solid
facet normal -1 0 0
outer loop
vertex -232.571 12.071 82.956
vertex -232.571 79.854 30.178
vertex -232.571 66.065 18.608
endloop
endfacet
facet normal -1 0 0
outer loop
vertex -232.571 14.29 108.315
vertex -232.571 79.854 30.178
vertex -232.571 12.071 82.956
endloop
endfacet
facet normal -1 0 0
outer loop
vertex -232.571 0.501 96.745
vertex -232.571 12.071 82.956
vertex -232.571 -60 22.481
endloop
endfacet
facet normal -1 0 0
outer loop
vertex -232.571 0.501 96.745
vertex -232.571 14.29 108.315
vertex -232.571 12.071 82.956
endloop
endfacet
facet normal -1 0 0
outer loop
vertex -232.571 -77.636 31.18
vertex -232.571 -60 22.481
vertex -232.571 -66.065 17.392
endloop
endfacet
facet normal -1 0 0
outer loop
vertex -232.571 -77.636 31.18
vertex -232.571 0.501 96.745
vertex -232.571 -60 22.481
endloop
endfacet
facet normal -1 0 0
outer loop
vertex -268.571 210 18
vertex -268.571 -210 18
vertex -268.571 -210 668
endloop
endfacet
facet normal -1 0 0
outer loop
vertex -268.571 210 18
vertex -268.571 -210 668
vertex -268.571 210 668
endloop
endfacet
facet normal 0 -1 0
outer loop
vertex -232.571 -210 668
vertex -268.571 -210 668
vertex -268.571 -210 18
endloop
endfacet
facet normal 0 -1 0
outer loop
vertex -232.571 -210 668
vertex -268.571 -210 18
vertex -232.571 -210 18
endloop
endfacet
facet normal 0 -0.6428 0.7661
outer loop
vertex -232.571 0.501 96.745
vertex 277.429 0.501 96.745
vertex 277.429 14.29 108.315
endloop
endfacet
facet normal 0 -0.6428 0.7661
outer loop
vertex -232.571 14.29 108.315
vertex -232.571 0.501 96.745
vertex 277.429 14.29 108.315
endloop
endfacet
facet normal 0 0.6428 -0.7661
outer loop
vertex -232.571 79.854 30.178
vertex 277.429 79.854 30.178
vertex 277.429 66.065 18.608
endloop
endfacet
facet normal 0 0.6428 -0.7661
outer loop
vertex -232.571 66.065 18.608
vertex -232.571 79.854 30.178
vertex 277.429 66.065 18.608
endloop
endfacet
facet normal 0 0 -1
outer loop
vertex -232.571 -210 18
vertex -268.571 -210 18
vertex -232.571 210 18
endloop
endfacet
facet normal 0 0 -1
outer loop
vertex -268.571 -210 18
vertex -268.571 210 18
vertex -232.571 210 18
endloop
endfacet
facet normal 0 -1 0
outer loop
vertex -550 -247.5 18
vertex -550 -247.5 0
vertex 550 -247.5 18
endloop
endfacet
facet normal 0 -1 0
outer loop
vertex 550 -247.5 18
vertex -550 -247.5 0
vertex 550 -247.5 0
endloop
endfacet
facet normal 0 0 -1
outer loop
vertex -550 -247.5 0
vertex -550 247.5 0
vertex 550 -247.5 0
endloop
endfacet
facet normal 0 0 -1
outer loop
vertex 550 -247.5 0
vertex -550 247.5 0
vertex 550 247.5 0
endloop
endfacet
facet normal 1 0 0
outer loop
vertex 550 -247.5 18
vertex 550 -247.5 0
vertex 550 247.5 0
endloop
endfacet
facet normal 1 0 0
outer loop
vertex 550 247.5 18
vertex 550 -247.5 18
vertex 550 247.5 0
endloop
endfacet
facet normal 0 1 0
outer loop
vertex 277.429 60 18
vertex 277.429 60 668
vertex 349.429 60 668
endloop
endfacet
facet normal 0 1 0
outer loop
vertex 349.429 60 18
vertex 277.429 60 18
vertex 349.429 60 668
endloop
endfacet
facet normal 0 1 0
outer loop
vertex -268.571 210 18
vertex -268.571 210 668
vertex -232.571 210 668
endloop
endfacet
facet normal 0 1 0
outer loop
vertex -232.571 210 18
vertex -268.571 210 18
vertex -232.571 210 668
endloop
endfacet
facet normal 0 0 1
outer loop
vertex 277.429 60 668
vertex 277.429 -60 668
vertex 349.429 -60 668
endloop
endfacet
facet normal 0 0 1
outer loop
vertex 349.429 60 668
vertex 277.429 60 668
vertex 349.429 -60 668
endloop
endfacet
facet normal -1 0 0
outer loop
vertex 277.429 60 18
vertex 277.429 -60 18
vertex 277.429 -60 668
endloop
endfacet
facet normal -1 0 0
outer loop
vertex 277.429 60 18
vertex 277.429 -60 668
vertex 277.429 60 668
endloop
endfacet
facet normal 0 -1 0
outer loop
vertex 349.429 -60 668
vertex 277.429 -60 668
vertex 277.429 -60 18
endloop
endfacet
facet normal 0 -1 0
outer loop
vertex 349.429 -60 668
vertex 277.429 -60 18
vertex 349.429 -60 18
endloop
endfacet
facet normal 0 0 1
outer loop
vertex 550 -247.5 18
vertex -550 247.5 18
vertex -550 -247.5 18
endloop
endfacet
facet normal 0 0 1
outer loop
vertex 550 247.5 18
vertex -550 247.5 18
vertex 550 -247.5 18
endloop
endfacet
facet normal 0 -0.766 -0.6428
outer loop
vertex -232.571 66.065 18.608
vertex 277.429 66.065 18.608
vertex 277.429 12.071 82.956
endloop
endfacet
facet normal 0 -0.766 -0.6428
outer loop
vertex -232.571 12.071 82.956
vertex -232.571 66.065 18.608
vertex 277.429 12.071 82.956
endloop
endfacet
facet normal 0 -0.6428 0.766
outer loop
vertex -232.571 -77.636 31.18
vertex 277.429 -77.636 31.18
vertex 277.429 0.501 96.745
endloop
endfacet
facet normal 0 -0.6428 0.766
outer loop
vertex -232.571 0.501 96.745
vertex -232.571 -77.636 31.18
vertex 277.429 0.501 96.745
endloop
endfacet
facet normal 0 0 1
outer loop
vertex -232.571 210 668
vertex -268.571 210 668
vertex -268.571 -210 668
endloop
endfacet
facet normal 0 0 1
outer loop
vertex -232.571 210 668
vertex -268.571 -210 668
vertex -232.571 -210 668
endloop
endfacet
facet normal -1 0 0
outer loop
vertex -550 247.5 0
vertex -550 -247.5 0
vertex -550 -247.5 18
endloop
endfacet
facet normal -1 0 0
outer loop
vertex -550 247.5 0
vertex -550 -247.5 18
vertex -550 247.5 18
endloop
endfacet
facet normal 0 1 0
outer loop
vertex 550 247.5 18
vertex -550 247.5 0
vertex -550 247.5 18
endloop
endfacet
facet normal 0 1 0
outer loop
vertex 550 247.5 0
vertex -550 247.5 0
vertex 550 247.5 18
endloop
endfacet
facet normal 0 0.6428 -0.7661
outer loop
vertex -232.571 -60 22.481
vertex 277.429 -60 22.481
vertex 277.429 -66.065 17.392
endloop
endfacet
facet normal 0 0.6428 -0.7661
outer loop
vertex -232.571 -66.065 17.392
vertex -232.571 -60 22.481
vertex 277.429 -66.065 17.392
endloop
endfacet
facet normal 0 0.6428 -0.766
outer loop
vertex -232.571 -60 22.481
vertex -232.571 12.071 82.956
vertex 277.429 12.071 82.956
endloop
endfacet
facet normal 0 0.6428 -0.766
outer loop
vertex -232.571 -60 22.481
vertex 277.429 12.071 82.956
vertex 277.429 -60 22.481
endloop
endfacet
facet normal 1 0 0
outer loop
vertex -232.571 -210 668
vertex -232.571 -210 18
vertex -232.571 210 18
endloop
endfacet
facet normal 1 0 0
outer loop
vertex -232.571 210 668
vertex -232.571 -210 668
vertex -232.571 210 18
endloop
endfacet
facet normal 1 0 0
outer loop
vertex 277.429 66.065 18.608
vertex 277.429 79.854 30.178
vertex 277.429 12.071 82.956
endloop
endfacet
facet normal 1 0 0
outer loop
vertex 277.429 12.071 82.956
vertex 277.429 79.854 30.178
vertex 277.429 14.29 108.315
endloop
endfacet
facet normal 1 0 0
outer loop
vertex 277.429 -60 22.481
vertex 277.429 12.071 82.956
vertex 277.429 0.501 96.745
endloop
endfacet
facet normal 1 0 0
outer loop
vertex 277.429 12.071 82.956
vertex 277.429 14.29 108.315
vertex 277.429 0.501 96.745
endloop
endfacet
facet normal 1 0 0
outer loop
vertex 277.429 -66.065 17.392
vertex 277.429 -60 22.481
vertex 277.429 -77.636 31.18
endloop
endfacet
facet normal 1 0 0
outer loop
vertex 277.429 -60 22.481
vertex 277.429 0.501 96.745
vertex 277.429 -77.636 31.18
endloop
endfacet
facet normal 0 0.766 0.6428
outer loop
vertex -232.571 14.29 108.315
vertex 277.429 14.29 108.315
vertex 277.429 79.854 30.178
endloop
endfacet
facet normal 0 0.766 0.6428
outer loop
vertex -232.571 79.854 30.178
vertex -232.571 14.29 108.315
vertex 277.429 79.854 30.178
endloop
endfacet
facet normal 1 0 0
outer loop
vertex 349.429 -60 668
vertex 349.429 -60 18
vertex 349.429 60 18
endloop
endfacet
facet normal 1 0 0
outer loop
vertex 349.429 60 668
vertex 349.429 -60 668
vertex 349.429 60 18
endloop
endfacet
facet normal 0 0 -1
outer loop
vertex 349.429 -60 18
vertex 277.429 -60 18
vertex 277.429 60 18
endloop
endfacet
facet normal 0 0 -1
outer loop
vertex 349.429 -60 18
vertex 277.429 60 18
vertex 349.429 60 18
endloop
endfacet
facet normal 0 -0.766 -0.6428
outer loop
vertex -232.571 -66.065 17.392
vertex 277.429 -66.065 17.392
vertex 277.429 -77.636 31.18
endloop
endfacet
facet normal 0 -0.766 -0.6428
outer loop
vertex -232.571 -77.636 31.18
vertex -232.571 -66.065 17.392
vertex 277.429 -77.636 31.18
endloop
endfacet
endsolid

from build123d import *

# Parameters (mm, degrees)
F0_W     = 1100
F0_H     = 495
F1_DEPTH = 18
F2_W     = 36
F2_H     = 420
F3_DEPTH = 650
F2_W_2   = 72
F2_H_2   = 120
F4_W     = 120
F4_H     = 650
F5_DEPTH = 899.4299889932
F7_DEPTH = 650
F9_DEPTH = 510


# Not quite as in the source:
# - a feature names something its author has since deleted; it is built from what else it names


with BuildPart() as f1:
    # F0 (on Top) → F1 (new body)
    with BuildSketch(Plane.XY):
        Rectangle(F0_W, F0_H)
    extrude(amount=F1_DEPTH)


with BuildPart() as f3:
    # F2 (on face) → F3 (new body)
    with BuildSketch(Plane.XY.offset(18)):
        with Locations((-250.5710110068, 0)):
            Rectangle(F2_W, F2_H)
    extrude(amount=F3_DEPTH)


with BuildPart() as f3b:
    # F2 (on face) → F3, piece 2 (new body)
    with BuildSketch(Plane.XY.offset(18)):
        with Locations((313.4289889932, 0)):
            Rectangle(F2_W_2, F2_H_2)
    extrude(amount=F3_DEPTH)


with BuildPart() as f5_tool:
    # F4 (on face) → F5 (new body, through all)
    with BuildSketch(Plane.YZ.offset(349.4289889932)):
        with Locations((0, 343)):
            Rectangle(F4_W, F4_H)
    extrude(amount=-F5_DEPTH)


with BuildPart() as f3_1:
    add(f3.part)

    # F5: cut by f5_tool
    add(f5_tool.part, mode=Mode.SUBTRACT)

    # F2 (on face) → F7 (join)
    with BuildSketch(Plane.XY.offset(18)):
        with Locations((-250.5710110068, 0)):
            Rectangle(F2_W, F2_H)
    extrude(amount=F7_DEPTH)


with BuildPart() as f3b_1:
    add(f3b.part)

    # F5: cut by f5_tool
    add(f5_tool.part, mode=Mode.SUBTRACT)


with BuildPart() as f7:
    # F2 (on face) → F7, piece 2 (new body)
    with BuildSketch(Plane.XY.offset(18)):
        with Locations((313.4289889932, 0)):
            Rectangle(F2_W_2, F2_H_2)
    extrude(amount=F7_DEPTH)


with BuildPart() as f9:
    # F8 (on face) → F9 (new body)
    with BuildSketch(Plane(origin=(277.4289889932, 0, 0), x_dir=(0, -1, 0), z_dir=(-1, 0, 0))):
        Polygon((-0.5010100179, 96.7448346812), (-14.289809994, 108.3150116555), (-60, 53.8397284977), (-60, 25.8366996142), (-12.0711869922, 82.956034705), align=None)
        Polygon((60, 45.9784594893), (-0.5010100179, 96.7448346812), (-12.0711869922, 82.956034705), (60, 22.4811282813), align=None)
        Polygon((77.6355231803, 31.1804984931), (60, 45.9784594893), (60, 22.4811282813), (66.0653462059, 17.391698517), align=None)
        Polygon((-60, 25.8366996142), (-60, 53.8397284977), (-79.854146182, 30.1784784574), (-66.0653462059, 18.608301483), align=None)
    extrude(amount=F9_DEPTH)


solid = Compound([f1.part, f3_1.part, f7.part, f9.part])
